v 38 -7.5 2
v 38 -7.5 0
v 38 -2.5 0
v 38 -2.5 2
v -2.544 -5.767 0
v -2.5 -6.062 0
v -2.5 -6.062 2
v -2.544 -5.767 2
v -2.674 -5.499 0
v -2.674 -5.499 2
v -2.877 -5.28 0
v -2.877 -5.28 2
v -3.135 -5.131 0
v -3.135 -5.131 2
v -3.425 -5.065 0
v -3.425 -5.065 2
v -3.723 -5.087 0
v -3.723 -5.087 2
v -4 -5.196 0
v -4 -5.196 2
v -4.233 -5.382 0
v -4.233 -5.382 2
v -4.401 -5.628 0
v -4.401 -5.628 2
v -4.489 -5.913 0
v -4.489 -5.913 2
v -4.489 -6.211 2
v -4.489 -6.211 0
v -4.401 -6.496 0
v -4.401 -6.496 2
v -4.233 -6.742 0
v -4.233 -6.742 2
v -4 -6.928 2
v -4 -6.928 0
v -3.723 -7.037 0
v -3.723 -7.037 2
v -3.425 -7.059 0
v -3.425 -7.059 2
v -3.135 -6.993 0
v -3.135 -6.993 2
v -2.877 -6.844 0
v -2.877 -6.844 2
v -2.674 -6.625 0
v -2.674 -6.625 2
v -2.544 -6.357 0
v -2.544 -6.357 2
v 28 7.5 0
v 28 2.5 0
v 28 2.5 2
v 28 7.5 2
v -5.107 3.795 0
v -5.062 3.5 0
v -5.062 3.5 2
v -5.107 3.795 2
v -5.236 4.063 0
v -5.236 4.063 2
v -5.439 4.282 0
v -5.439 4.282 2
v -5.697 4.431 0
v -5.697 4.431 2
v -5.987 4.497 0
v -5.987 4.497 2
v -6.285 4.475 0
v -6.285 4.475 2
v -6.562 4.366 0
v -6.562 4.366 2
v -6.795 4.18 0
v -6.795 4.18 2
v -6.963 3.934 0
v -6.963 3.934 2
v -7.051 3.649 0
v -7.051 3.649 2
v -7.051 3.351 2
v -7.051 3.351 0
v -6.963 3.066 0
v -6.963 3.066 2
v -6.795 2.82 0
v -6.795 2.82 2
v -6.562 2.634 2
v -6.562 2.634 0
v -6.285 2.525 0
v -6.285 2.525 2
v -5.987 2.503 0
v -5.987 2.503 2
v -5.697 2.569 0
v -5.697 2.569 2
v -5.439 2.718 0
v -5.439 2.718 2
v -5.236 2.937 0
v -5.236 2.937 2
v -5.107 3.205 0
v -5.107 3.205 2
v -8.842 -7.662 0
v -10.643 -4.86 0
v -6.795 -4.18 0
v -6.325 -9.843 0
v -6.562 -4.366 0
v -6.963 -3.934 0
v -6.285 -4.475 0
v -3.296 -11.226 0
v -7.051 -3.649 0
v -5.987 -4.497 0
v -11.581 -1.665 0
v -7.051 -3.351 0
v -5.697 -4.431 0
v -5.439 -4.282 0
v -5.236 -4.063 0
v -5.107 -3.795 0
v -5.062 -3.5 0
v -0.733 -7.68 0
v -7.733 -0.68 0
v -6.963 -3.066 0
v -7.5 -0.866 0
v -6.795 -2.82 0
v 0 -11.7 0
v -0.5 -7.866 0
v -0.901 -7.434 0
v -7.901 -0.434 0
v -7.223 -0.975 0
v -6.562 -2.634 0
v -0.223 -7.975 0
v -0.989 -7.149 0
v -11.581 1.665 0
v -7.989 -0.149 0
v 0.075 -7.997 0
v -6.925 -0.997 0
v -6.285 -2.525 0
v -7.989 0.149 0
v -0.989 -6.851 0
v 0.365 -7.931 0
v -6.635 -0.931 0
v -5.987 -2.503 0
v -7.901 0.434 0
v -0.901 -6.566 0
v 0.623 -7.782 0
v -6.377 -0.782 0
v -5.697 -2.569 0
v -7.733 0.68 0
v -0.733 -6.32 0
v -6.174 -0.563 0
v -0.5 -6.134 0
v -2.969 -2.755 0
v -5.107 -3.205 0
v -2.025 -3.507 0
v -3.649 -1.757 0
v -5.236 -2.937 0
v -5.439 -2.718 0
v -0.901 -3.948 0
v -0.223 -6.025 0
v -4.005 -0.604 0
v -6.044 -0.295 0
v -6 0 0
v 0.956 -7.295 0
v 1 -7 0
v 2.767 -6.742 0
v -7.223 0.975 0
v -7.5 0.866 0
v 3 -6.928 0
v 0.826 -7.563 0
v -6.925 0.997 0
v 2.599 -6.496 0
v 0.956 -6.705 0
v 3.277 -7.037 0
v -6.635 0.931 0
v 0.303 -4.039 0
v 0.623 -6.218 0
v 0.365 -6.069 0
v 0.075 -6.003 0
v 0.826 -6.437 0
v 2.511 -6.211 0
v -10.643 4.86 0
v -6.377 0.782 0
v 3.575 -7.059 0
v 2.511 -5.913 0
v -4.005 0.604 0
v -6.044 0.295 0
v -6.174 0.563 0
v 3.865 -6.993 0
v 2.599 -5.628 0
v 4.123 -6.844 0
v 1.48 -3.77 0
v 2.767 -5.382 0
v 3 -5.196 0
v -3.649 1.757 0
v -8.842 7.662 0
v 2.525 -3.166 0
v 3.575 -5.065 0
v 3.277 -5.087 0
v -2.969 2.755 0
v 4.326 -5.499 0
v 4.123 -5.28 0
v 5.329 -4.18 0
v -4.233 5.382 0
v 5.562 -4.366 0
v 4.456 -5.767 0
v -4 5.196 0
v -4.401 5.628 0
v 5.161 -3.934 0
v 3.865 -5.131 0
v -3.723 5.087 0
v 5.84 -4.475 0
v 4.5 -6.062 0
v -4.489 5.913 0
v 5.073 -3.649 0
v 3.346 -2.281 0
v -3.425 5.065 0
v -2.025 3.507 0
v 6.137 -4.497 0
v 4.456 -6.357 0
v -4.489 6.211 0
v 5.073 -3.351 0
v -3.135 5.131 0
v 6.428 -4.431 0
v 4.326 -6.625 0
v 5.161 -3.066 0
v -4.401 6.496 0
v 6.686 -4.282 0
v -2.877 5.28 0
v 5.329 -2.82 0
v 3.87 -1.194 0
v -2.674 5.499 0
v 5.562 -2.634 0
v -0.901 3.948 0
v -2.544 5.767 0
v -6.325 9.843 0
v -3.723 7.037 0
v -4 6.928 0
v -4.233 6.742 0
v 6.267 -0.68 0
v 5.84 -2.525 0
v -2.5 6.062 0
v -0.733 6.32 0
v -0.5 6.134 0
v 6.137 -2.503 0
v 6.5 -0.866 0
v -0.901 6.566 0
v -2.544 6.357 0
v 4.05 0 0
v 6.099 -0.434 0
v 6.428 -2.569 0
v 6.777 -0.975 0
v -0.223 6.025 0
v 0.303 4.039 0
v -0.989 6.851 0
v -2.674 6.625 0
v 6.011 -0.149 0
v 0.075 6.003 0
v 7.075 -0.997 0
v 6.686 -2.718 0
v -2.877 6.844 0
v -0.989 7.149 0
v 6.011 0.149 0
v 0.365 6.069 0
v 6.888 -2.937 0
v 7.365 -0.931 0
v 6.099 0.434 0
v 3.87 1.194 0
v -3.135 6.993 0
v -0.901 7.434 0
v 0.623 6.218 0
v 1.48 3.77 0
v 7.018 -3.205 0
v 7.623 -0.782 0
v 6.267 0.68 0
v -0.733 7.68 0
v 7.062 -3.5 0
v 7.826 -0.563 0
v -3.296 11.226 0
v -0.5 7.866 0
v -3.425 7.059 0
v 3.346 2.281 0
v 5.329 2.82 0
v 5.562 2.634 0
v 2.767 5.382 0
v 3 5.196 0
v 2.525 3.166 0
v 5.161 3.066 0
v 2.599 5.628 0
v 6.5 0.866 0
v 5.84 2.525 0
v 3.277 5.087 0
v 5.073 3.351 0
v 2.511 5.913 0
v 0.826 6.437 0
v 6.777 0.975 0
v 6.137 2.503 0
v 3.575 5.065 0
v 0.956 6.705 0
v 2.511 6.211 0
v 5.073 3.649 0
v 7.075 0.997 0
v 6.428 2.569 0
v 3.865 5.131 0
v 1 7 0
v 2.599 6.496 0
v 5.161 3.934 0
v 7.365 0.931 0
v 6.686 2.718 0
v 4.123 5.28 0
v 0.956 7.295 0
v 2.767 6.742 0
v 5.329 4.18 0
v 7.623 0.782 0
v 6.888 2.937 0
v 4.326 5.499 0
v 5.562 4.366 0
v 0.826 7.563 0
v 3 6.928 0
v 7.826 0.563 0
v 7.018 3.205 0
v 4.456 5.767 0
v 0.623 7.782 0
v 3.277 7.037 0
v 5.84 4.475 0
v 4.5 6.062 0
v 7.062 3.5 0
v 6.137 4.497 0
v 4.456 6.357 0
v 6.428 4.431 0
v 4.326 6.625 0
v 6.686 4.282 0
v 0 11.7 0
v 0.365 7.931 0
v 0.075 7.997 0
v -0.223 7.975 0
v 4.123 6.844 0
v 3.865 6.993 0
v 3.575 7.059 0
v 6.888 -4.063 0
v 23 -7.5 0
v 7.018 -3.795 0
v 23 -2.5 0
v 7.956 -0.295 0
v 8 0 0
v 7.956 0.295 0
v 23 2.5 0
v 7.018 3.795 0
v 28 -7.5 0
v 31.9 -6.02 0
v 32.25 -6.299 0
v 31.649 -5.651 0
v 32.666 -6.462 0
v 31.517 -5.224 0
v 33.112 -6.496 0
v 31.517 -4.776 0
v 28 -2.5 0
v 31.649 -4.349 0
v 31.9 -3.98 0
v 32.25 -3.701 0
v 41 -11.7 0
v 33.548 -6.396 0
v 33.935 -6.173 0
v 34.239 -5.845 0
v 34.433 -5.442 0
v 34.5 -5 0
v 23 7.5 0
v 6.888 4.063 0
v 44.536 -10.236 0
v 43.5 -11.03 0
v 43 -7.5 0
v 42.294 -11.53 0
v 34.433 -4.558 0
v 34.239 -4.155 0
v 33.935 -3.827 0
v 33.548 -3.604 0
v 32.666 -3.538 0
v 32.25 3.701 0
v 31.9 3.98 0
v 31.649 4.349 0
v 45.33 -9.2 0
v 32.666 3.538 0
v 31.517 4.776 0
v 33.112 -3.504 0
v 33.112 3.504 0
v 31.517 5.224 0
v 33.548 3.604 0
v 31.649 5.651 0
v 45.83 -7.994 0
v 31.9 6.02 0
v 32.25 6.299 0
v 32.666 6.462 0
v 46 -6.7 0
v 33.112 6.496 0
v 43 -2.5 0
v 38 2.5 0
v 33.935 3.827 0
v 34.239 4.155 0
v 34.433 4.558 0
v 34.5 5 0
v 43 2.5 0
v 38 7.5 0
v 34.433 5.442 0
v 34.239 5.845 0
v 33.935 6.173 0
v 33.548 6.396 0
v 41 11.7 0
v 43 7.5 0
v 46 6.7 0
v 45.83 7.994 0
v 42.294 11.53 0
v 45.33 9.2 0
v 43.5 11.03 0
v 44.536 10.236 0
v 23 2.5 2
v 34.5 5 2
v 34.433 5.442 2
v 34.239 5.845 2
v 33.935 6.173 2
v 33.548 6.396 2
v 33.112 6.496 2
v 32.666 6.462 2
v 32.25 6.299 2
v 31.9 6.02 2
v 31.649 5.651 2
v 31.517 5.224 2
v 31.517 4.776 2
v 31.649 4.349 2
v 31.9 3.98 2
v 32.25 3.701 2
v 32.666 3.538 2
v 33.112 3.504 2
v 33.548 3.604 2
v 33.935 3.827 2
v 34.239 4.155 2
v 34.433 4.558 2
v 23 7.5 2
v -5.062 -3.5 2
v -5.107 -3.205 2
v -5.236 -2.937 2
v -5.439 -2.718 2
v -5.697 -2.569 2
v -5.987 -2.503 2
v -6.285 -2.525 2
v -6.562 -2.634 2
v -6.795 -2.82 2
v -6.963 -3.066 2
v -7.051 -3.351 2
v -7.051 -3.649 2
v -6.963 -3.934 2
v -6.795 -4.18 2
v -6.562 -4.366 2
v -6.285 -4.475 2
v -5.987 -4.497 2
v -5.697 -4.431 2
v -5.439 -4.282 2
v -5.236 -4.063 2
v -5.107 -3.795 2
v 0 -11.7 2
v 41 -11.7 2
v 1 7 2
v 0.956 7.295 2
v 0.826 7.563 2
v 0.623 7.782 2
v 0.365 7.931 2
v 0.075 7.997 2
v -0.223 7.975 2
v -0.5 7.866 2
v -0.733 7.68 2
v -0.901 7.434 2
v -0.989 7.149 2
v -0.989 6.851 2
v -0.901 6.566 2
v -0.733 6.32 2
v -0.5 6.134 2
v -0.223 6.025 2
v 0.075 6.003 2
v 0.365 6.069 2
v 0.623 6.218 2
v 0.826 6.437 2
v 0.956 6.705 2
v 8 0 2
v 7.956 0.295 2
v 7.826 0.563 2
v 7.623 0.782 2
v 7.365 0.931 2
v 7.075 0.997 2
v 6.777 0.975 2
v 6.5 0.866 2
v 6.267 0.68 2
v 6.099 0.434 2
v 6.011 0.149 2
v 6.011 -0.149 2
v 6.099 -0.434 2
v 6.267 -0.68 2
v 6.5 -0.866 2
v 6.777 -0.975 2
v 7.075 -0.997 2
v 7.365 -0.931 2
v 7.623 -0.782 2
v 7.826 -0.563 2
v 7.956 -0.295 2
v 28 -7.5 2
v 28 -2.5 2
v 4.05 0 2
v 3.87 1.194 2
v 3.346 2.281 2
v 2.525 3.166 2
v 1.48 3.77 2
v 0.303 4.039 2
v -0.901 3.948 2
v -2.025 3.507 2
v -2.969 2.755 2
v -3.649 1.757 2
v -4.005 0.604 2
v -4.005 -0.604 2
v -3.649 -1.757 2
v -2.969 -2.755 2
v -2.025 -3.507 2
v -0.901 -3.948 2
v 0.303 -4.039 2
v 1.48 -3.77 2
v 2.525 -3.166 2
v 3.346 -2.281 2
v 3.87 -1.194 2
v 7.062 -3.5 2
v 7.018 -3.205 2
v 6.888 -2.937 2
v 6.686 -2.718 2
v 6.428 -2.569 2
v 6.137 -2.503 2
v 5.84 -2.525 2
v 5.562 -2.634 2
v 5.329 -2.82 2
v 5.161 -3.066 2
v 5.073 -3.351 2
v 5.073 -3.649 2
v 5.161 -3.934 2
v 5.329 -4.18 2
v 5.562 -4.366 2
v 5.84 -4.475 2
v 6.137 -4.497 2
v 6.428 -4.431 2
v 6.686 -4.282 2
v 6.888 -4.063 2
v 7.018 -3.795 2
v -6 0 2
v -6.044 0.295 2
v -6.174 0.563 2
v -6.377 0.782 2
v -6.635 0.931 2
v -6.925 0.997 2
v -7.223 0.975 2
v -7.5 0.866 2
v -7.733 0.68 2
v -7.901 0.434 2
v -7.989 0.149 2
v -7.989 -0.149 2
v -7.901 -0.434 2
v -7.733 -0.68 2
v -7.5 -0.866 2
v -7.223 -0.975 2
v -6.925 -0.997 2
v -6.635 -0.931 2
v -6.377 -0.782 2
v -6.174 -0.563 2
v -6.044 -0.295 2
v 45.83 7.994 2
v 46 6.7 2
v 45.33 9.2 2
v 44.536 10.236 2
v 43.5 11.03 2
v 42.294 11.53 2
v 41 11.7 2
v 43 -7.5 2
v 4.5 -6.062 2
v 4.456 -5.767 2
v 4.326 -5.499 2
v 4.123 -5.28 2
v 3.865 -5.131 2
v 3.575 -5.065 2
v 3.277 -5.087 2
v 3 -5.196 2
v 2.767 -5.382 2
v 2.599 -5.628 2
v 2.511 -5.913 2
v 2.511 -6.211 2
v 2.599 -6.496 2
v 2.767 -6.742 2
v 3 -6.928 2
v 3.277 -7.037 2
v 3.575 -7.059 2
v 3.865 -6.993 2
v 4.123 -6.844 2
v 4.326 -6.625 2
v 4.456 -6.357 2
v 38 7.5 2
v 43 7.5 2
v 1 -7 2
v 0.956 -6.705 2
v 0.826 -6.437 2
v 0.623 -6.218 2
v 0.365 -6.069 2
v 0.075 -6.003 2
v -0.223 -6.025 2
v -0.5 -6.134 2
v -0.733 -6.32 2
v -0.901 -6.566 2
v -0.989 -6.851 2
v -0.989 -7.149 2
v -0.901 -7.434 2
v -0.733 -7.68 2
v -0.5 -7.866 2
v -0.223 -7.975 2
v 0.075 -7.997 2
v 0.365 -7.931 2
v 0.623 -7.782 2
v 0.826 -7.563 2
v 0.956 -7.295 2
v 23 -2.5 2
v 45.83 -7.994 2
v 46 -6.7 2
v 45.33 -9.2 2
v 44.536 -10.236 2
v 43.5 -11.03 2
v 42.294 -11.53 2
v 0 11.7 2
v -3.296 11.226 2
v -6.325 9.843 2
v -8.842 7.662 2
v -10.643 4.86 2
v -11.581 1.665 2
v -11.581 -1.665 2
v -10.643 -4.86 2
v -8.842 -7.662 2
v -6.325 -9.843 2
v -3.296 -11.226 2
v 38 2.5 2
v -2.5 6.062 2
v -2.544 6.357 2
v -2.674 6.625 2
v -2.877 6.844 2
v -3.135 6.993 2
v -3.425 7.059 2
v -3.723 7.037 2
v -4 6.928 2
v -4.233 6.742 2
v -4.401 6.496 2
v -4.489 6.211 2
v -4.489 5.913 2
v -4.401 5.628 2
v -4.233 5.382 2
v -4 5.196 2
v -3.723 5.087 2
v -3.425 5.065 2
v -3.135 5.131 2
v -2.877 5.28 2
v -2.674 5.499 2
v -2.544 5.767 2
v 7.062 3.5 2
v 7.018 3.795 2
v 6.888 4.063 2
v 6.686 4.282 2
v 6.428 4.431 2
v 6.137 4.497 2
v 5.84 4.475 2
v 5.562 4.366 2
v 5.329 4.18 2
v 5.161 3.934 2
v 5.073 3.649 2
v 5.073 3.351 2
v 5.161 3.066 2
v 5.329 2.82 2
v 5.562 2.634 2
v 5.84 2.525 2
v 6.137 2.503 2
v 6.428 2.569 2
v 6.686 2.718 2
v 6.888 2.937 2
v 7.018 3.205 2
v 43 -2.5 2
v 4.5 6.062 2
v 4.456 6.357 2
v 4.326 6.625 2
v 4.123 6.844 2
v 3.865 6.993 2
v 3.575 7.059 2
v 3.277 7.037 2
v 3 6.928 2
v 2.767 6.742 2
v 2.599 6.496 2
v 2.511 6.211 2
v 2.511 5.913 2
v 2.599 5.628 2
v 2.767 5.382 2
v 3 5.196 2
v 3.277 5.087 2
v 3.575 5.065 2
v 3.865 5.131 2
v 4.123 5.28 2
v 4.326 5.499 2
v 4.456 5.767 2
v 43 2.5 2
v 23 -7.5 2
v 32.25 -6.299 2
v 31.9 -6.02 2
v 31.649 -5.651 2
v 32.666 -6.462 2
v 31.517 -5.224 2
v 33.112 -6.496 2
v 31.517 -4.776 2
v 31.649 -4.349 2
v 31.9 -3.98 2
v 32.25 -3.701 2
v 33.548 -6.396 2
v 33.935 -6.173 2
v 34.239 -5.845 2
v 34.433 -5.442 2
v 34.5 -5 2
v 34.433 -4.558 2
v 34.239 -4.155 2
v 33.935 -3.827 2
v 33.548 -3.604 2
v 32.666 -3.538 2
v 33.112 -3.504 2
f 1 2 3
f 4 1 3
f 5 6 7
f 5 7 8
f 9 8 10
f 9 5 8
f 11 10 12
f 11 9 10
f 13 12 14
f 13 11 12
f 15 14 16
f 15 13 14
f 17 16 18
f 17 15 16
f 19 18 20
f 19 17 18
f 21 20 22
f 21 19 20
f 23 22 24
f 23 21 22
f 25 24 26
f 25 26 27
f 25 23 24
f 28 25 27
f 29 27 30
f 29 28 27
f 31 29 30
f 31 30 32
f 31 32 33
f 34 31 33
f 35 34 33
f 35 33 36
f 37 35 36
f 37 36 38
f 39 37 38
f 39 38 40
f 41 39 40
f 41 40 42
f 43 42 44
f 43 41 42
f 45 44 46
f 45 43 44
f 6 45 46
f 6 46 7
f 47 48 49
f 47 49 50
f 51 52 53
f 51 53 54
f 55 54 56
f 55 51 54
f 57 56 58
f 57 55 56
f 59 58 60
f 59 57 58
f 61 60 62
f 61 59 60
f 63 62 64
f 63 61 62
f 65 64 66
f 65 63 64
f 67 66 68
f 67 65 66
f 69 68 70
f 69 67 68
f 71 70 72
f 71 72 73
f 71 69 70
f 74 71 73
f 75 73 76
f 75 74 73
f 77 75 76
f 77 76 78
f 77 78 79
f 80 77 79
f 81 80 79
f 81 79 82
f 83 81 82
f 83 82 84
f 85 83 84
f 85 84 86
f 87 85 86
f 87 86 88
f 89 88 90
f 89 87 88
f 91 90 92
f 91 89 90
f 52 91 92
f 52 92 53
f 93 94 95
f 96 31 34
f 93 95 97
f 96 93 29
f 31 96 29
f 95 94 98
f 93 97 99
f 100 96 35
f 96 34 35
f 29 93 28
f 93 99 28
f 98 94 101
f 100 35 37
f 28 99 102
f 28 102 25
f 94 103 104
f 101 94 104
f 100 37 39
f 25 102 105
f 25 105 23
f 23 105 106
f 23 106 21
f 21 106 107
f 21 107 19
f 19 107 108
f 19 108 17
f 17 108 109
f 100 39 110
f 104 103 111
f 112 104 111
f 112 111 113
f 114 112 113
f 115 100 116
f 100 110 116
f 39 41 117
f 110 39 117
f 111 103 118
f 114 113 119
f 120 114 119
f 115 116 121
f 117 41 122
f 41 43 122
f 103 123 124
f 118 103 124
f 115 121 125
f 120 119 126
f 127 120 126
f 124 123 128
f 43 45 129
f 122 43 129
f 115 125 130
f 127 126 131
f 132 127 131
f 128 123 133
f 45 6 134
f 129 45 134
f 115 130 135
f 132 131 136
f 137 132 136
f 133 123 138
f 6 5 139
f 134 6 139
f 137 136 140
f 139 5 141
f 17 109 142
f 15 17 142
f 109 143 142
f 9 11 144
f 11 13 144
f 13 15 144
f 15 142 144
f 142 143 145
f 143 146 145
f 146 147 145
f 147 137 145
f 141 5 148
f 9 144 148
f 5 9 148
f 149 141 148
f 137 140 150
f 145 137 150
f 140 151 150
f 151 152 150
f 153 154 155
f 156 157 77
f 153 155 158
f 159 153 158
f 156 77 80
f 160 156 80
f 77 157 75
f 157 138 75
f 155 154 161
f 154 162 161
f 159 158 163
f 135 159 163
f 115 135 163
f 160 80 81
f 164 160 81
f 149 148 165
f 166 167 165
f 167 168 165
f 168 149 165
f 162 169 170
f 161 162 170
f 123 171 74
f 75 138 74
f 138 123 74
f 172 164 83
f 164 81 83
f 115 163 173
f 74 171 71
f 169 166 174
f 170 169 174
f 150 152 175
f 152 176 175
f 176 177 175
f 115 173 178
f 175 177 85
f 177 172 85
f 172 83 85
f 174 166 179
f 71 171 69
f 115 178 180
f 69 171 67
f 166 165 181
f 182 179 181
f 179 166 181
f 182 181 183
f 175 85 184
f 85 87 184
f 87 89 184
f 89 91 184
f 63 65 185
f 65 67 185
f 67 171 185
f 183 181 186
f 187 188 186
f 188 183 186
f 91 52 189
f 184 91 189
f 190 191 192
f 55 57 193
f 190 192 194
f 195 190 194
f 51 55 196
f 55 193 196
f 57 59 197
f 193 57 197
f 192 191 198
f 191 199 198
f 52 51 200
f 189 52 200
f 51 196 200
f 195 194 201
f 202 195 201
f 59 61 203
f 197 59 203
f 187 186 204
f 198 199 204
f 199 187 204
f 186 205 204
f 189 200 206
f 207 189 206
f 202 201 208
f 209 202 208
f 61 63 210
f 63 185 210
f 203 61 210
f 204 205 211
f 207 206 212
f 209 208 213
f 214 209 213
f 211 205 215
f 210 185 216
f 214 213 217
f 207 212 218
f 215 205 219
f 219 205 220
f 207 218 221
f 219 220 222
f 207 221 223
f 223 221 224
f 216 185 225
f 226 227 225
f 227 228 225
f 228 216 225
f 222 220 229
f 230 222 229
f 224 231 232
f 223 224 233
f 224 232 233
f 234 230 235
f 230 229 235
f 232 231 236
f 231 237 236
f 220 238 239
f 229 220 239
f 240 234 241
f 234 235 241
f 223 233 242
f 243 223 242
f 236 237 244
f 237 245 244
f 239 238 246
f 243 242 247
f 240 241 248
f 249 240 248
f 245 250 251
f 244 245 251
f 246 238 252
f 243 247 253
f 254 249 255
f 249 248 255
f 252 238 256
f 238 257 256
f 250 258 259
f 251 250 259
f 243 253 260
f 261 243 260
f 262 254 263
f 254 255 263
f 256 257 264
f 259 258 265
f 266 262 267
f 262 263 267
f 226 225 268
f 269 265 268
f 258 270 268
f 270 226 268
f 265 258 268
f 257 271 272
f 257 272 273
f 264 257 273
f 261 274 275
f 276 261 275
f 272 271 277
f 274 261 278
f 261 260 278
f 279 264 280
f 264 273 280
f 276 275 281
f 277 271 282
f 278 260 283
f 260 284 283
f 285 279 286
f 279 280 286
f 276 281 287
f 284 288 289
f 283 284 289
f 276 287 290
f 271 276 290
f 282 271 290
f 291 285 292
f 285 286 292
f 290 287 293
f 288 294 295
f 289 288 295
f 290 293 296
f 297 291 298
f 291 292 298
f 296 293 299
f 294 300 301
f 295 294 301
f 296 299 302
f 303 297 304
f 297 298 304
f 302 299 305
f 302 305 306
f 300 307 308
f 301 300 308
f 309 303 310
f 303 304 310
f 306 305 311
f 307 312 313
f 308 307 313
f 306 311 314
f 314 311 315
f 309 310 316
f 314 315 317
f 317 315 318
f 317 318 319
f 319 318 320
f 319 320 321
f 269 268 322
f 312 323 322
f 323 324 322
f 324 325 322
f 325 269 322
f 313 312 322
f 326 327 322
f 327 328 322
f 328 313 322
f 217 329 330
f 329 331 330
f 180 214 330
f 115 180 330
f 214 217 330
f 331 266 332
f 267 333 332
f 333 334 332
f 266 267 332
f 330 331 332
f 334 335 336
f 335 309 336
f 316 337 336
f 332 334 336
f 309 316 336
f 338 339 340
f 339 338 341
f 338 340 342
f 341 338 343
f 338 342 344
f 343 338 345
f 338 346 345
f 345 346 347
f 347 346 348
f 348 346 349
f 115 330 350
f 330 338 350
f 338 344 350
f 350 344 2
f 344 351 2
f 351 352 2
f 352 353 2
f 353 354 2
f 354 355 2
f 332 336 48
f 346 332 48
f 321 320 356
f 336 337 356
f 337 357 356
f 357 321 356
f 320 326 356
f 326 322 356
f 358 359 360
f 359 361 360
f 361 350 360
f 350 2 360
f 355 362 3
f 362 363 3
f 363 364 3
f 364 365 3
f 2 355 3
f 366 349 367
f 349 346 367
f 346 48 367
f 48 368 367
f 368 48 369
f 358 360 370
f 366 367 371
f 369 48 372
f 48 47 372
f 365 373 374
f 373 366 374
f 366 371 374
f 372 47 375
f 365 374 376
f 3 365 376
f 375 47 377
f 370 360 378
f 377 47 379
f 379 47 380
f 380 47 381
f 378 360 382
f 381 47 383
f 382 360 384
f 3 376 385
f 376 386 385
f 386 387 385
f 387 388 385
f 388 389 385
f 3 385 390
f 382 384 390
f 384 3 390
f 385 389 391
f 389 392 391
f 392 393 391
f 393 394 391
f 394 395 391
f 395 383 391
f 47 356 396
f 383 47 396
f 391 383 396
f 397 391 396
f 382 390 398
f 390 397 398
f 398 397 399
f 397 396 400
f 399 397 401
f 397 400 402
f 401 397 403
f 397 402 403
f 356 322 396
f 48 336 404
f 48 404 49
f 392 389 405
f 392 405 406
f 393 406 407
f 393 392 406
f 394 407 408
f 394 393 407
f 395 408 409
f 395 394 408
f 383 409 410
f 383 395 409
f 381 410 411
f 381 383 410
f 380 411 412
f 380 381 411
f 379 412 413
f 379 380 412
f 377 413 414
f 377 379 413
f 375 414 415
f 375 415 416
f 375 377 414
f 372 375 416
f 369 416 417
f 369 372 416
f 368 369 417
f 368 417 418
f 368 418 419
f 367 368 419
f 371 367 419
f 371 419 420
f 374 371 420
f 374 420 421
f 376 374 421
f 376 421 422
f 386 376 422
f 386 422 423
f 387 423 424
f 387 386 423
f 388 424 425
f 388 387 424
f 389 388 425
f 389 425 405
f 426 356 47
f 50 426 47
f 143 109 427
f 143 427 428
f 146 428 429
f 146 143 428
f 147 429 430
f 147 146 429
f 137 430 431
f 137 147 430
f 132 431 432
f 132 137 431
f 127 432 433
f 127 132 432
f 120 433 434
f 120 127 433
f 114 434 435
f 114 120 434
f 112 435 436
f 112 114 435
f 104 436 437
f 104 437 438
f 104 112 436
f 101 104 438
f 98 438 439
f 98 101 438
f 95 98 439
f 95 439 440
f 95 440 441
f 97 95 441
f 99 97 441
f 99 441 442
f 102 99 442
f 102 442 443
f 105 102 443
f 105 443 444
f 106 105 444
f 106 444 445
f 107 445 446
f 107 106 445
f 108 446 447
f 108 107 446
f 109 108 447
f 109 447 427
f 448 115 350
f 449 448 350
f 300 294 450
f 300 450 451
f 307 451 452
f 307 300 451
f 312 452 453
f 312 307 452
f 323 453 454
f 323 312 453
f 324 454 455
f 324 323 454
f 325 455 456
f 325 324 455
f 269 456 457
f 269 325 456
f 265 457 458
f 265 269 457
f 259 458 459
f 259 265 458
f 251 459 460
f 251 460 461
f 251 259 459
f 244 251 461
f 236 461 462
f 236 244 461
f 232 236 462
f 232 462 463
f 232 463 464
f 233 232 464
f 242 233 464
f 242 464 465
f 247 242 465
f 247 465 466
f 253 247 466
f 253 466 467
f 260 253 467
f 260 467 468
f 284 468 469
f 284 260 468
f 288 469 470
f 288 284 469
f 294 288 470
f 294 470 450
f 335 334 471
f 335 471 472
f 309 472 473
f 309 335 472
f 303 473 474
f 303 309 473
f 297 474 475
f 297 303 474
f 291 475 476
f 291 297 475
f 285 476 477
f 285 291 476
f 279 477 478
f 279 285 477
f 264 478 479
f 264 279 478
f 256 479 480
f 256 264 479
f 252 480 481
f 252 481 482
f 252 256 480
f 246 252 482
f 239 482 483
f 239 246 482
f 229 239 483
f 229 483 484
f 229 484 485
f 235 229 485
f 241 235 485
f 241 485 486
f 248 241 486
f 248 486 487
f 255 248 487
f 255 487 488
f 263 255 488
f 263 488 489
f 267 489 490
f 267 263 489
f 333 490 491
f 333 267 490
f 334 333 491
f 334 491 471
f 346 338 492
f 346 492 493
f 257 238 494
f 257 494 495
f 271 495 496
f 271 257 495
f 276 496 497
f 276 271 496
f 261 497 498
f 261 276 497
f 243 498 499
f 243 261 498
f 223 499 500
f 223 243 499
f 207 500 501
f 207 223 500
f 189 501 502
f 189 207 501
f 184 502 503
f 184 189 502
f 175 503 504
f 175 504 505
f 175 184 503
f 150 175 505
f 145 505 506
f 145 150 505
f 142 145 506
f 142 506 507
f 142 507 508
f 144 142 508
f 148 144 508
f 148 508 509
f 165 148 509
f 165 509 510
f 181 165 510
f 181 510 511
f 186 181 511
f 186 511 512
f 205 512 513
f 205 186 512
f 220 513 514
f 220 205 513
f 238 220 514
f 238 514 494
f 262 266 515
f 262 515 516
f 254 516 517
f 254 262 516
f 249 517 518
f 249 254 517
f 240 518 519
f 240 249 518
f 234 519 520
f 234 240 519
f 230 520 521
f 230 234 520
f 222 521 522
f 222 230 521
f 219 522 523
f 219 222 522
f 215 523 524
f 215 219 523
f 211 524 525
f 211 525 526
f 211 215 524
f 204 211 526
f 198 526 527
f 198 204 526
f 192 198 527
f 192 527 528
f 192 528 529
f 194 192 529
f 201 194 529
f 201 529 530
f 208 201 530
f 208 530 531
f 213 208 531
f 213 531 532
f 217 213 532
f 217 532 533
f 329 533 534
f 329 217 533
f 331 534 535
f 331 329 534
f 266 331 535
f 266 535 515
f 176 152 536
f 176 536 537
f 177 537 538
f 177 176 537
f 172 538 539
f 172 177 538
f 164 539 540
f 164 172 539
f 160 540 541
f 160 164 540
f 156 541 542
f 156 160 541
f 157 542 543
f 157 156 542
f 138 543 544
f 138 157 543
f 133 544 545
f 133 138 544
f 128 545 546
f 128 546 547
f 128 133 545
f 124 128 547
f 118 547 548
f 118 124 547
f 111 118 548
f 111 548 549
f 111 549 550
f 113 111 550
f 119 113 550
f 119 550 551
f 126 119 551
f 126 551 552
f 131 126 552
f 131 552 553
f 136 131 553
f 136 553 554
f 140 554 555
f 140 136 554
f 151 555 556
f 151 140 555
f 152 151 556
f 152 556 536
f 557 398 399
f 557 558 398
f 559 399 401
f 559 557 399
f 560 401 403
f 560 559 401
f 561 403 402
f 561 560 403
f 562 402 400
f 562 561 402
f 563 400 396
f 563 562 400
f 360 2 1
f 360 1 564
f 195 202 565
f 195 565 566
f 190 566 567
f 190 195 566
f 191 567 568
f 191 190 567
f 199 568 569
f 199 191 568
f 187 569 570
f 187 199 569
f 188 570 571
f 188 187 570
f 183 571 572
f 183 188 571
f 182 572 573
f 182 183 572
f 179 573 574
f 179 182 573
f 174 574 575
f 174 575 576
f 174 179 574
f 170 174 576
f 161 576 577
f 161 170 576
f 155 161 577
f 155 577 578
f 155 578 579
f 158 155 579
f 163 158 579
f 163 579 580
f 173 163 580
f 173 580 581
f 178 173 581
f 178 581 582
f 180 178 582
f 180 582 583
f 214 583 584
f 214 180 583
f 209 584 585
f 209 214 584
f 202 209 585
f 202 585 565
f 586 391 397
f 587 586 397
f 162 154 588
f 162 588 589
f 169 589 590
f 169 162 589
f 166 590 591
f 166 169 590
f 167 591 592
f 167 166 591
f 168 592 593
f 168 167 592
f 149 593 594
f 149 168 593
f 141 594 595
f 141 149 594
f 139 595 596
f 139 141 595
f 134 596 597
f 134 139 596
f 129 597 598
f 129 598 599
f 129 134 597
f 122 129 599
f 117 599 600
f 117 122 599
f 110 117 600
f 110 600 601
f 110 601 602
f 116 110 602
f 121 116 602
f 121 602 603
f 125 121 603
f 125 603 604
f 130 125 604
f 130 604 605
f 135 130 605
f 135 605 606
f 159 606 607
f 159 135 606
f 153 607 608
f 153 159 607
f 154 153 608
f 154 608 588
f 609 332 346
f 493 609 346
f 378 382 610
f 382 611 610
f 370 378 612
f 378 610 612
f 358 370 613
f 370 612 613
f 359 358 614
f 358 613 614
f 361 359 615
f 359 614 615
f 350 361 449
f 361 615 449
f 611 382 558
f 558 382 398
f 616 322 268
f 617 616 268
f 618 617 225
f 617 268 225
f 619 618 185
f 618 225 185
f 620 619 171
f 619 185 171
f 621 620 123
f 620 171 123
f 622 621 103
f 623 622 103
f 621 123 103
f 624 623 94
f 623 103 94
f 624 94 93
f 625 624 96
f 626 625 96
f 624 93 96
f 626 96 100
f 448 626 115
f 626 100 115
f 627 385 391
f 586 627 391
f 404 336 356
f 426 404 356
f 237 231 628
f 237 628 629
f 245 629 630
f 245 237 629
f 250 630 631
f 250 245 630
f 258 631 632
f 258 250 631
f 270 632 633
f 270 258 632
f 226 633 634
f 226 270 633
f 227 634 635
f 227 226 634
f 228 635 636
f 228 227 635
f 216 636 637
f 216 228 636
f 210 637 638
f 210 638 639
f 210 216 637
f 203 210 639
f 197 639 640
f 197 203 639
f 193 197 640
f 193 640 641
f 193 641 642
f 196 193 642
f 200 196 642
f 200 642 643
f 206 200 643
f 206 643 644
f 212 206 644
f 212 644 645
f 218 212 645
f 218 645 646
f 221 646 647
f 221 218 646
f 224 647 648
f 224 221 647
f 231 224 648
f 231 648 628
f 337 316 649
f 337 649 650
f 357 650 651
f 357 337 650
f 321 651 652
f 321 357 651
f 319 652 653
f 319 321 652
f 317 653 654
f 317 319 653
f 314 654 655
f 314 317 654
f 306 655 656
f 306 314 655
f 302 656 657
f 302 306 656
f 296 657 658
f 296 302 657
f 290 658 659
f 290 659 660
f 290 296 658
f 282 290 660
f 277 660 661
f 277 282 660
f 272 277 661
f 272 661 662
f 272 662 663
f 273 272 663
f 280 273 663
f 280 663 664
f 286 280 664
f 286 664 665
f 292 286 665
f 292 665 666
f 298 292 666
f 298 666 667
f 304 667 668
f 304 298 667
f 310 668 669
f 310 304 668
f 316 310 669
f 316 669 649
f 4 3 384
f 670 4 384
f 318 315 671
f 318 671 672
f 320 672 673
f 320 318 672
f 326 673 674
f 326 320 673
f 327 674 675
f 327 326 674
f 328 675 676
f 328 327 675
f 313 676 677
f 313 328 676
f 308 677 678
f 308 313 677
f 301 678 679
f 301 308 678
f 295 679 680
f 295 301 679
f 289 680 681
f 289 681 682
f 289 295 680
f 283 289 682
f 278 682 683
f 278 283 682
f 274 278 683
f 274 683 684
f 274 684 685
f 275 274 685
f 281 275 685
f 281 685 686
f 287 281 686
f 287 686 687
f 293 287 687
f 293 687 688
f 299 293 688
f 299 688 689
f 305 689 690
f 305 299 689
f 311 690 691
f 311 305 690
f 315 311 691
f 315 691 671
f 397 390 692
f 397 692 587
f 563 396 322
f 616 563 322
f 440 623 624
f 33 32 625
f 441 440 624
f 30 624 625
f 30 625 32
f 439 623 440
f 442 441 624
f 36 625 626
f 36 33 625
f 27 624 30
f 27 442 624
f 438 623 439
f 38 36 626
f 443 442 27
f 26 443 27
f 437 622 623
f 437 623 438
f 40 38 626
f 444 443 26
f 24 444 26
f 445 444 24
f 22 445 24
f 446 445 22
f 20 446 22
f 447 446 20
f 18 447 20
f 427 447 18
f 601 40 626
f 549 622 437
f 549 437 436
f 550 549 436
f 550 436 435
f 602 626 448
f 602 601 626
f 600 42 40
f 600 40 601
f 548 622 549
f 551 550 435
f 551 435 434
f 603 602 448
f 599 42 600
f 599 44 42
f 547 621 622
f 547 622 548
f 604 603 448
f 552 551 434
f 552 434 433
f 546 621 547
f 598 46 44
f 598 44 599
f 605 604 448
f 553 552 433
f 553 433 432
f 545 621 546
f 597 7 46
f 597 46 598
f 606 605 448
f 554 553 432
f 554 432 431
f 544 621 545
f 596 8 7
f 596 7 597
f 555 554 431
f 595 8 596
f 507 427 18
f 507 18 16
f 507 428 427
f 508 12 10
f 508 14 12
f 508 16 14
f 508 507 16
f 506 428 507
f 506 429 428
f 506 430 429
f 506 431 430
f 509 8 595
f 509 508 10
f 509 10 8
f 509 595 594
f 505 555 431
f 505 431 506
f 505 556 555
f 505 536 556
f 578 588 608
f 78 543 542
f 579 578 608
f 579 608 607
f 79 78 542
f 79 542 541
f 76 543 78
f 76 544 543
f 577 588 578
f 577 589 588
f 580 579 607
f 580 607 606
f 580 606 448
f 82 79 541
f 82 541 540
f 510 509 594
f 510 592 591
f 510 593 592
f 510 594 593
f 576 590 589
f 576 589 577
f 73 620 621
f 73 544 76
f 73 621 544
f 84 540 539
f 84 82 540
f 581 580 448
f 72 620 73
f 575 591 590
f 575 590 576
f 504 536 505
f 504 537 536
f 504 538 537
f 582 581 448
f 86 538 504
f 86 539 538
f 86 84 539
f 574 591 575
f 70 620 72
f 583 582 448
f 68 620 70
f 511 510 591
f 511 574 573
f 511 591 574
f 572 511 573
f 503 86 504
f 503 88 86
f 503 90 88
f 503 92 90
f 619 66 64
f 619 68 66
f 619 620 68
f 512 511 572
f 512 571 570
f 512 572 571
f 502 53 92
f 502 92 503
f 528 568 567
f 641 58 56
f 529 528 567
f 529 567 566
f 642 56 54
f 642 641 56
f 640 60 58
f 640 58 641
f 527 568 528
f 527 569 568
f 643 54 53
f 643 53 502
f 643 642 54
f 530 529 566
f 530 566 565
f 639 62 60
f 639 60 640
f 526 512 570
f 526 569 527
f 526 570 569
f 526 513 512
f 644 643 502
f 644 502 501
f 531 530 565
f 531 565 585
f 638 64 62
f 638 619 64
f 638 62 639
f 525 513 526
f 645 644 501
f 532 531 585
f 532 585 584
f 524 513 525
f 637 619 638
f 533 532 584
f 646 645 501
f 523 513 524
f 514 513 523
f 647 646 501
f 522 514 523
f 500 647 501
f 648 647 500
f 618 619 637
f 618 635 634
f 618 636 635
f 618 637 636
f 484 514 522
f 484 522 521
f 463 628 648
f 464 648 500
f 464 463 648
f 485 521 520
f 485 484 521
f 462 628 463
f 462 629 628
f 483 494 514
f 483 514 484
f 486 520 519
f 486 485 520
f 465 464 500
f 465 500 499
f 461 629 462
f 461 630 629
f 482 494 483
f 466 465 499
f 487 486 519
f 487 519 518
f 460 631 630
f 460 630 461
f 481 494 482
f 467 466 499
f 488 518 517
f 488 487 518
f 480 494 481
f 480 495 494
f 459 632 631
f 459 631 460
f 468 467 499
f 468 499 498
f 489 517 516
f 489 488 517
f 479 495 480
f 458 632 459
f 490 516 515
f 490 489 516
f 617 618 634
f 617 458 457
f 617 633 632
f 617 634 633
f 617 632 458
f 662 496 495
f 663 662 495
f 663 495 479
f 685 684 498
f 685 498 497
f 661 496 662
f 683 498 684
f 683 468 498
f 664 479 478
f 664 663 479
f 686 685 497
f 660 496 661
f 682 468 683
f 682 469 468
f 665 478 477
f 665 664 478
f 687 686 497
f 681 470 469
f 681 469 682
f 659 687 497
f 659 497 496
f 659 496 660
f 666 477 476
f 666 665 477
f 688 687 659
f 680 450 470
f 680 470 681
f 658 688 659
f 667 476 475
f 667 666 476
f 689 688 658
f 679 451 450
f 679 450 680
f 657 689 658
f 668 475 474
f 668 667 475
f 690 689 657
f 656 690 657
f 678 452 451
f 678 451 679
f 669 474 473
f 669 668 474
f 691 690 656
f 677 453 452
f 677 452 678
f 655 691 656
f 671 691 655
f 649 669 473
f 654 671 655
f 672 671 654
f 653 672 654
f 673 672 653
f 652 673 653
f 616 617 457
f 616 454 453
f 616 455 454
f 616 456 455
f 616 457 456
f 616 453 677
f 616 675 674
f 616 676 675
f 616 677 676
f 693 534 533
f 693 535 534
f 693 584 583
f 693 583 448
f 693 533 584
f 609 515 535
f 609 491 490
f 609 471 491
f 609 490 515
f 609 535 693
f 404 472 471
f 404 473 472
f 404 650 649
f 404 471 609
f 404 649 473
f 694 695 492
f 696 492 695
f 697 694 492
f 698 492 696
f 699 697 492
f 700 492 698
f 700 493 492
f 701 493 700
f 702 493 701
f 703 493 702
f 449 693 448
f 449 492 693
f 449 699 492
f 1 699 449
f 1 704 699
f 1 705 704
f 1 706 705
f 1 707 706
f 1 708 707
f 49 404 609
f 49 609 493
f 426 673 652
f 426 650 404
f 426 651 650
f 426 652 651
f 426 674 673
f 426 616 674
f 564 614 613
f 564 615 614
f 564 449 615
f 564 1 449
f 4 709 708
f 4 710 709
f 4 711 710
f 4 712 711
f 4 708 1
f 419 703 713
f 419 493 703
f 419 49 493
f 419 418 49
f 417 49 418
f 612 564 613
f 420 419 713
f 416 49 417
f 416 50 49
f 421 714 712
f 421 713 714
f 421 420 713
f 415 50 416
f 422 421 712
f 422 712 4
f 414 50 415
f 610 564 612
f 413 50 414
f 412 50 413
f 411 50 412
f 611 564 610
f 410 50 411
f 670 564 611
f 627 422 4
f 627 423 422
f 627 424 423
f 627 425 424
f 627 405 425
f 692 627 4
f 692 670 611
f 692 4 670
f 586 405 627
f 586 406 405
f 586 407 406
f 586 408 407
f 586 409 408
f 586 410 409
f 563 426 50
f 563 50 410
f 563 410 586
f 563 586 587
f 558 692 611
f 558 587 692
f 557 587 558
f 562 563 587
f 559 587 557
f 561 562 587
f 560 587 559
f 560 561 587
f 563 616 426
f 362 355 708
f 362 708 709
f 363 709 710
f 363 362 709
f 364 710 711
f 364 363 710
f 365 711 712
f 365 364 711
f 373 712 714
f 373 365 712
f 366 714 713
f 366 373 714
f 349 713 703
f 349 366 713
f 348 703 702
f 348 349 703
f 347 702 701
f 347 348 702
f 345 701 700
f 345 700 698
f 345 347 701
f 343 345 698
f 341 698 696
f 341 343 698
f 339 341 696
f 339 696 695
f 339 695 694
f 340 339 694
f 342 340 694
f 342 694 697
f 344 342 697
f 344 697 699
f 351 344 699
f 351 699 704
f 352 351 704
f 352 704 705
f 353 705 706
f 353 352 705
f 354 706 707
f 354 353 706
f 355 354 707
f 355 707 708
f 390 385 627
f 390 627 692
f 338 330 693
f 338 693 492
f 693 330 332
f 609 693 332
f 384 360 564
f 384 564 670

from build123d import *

# Parameters (mm, degrees)
BOSS_EXTRUDE1_OUTLINE_R   = 1
BOSS_EXTRUDE1_OUTLINE_W   = 5
BOSS_EXTRUDE1_OUTLINE_H   = 5
BOSS_EXTRUDE1_OUTLINE_R_2 = 1.5
BOSS_EXTRUDE1_OUTLINE_R_3 = 4.05
BOSS_EXTRUDE1_DEPTH       = 2
CONG_1_R                  = 5


# Read off the part's stored shape, not the designer's step: Boss-Extrude1
with BuildPart() as part:
    # Boss-Extrude1 outline → Boss-Extrude1 (new body)
    with BuildSketch(Plane.XY):
        with BuildLine():
            Line((46, -11.7), (46, 11.7))
            Line((46, 11.7), (0, 11.7))
            ThreePointArc((0, 11.7), (-11.7, 0), (0, -11.7))
            Line((0, -11.7), (46, -11.7))
        make_face()
        with Locations((-3.5, -6.062177826)):
            Circle(BOSS_EXTRUDE1_OUTLINE_R, mode=Mode.SUBTRACT)
        with Locations((0, -7)):
            Circle(BOSS_EXTRUDE1_OUTLINE_R, mode=Mode.SUBTRACT)
        with Locations((3.5, -6.062177826)):
            Circle(BOSS_EXTRUDE1_OUTLINE_R, mode=Mode.SUBTRACT)
        with Locations((-6.062177826, -3.5)):
            Circle(BOSS_EXTRUDE1_OUTLINE_R, mode=Mode.SUBTRACT)
        with Locations((6.062177826, -3.5)):
            Circle(BOSS_EXTRUDE1_OUTLINE_R, mode=Mode.SUBTRACT)
        with Locations((25.5, -5)):
            Rectangle(BOSS_EXTRUDE1_OUTLINE_W, BOSS_EXTRUDE1_OUTLINE_H, mode=Mode.SUBTRACT)
        with Locations((33, -5)):
            Circle(BOSS_EXTRUDE1_OUTLINE_R_2, mode=Mode.SUBTRACT)
        with Locations((40.5, -5)):
            Rectangle(BOSS_EXTRUDE1_OUTLINE_W, BOSS_EXTRUDE1_OUTLINE_H, mode=Mode.SUBTRACT)
        with Locations((-7, 0)):
            Circle(BOSS_EXTRUDE1_OUTLINE_R, mode=Mode.SUBTRACT)
        Circle(BOSS_EXTRUDE1_OUTLINE_R_3, mode=Mode.SUBTRACT)
        with Locations((-6.062177826, 3.5)):
            Circle(BOSS_EXTRUDE1_OUTLINE_R, mode=Mode.SUBTRACT)
        with Locations((7, 0)):
            Circle(BOSS_EXTRUDE1_OUTLINE_R, mode=Mode.SUBTRACT)
        with Locations((6.062177826, 3.5)):
            Circle(BOSS_EXTRUDE1_OUTLINE_R, mode=Mode.SUBTRACT)
        with Locations((-3.5, 6.062177826)):
            Circle(BOSS_EXTRUDE1_OUTLINE_R, mode=Mode.SUBTRACT)
        with Locations((0, 7)):
            Circle(BOSS_EXTRUDE1_OUTLINE_R, mode=Mode.SUBTRACT)
        with Locations((3.5, 6.062177826)):
            Circle(BOSS_EXTRUDE1_OUTLINE_R, mode=Mode.SUBTRACT)
        with Locations((25.5, 5)):
            Rectangle(BOSS_EXTRUDE1_OUTLINE_W, BOSS_EXTRUDE1_OUTLINE_H, mode=Mode.SUBTRACT)
        with Locations((33, 5)):
            Circle(BOSS_EXTRUDE1_OUTLINE_R_2, mode=Mode.SUBTRACT)
        with Locations((40.5, 5)):
            Rectangle(BOSS_EXTRUDE1_OUTLINE_W, BOSS_EXTRUDE1_OUTLINE_H, mode=Mode.SUBTRACT)
    extrude(amount=BOSS_EXTRUDE1_DEPTH)

    # Congé1
    cong_1_edges = [part.edges().sort_by_distance(p)[0] for p in [
        (46, 11.7, 1),
        (46, -11.7, 1),
    ]]
    fillet(cong_1_edges, radius=CONG_1_R)


solid = part.part
